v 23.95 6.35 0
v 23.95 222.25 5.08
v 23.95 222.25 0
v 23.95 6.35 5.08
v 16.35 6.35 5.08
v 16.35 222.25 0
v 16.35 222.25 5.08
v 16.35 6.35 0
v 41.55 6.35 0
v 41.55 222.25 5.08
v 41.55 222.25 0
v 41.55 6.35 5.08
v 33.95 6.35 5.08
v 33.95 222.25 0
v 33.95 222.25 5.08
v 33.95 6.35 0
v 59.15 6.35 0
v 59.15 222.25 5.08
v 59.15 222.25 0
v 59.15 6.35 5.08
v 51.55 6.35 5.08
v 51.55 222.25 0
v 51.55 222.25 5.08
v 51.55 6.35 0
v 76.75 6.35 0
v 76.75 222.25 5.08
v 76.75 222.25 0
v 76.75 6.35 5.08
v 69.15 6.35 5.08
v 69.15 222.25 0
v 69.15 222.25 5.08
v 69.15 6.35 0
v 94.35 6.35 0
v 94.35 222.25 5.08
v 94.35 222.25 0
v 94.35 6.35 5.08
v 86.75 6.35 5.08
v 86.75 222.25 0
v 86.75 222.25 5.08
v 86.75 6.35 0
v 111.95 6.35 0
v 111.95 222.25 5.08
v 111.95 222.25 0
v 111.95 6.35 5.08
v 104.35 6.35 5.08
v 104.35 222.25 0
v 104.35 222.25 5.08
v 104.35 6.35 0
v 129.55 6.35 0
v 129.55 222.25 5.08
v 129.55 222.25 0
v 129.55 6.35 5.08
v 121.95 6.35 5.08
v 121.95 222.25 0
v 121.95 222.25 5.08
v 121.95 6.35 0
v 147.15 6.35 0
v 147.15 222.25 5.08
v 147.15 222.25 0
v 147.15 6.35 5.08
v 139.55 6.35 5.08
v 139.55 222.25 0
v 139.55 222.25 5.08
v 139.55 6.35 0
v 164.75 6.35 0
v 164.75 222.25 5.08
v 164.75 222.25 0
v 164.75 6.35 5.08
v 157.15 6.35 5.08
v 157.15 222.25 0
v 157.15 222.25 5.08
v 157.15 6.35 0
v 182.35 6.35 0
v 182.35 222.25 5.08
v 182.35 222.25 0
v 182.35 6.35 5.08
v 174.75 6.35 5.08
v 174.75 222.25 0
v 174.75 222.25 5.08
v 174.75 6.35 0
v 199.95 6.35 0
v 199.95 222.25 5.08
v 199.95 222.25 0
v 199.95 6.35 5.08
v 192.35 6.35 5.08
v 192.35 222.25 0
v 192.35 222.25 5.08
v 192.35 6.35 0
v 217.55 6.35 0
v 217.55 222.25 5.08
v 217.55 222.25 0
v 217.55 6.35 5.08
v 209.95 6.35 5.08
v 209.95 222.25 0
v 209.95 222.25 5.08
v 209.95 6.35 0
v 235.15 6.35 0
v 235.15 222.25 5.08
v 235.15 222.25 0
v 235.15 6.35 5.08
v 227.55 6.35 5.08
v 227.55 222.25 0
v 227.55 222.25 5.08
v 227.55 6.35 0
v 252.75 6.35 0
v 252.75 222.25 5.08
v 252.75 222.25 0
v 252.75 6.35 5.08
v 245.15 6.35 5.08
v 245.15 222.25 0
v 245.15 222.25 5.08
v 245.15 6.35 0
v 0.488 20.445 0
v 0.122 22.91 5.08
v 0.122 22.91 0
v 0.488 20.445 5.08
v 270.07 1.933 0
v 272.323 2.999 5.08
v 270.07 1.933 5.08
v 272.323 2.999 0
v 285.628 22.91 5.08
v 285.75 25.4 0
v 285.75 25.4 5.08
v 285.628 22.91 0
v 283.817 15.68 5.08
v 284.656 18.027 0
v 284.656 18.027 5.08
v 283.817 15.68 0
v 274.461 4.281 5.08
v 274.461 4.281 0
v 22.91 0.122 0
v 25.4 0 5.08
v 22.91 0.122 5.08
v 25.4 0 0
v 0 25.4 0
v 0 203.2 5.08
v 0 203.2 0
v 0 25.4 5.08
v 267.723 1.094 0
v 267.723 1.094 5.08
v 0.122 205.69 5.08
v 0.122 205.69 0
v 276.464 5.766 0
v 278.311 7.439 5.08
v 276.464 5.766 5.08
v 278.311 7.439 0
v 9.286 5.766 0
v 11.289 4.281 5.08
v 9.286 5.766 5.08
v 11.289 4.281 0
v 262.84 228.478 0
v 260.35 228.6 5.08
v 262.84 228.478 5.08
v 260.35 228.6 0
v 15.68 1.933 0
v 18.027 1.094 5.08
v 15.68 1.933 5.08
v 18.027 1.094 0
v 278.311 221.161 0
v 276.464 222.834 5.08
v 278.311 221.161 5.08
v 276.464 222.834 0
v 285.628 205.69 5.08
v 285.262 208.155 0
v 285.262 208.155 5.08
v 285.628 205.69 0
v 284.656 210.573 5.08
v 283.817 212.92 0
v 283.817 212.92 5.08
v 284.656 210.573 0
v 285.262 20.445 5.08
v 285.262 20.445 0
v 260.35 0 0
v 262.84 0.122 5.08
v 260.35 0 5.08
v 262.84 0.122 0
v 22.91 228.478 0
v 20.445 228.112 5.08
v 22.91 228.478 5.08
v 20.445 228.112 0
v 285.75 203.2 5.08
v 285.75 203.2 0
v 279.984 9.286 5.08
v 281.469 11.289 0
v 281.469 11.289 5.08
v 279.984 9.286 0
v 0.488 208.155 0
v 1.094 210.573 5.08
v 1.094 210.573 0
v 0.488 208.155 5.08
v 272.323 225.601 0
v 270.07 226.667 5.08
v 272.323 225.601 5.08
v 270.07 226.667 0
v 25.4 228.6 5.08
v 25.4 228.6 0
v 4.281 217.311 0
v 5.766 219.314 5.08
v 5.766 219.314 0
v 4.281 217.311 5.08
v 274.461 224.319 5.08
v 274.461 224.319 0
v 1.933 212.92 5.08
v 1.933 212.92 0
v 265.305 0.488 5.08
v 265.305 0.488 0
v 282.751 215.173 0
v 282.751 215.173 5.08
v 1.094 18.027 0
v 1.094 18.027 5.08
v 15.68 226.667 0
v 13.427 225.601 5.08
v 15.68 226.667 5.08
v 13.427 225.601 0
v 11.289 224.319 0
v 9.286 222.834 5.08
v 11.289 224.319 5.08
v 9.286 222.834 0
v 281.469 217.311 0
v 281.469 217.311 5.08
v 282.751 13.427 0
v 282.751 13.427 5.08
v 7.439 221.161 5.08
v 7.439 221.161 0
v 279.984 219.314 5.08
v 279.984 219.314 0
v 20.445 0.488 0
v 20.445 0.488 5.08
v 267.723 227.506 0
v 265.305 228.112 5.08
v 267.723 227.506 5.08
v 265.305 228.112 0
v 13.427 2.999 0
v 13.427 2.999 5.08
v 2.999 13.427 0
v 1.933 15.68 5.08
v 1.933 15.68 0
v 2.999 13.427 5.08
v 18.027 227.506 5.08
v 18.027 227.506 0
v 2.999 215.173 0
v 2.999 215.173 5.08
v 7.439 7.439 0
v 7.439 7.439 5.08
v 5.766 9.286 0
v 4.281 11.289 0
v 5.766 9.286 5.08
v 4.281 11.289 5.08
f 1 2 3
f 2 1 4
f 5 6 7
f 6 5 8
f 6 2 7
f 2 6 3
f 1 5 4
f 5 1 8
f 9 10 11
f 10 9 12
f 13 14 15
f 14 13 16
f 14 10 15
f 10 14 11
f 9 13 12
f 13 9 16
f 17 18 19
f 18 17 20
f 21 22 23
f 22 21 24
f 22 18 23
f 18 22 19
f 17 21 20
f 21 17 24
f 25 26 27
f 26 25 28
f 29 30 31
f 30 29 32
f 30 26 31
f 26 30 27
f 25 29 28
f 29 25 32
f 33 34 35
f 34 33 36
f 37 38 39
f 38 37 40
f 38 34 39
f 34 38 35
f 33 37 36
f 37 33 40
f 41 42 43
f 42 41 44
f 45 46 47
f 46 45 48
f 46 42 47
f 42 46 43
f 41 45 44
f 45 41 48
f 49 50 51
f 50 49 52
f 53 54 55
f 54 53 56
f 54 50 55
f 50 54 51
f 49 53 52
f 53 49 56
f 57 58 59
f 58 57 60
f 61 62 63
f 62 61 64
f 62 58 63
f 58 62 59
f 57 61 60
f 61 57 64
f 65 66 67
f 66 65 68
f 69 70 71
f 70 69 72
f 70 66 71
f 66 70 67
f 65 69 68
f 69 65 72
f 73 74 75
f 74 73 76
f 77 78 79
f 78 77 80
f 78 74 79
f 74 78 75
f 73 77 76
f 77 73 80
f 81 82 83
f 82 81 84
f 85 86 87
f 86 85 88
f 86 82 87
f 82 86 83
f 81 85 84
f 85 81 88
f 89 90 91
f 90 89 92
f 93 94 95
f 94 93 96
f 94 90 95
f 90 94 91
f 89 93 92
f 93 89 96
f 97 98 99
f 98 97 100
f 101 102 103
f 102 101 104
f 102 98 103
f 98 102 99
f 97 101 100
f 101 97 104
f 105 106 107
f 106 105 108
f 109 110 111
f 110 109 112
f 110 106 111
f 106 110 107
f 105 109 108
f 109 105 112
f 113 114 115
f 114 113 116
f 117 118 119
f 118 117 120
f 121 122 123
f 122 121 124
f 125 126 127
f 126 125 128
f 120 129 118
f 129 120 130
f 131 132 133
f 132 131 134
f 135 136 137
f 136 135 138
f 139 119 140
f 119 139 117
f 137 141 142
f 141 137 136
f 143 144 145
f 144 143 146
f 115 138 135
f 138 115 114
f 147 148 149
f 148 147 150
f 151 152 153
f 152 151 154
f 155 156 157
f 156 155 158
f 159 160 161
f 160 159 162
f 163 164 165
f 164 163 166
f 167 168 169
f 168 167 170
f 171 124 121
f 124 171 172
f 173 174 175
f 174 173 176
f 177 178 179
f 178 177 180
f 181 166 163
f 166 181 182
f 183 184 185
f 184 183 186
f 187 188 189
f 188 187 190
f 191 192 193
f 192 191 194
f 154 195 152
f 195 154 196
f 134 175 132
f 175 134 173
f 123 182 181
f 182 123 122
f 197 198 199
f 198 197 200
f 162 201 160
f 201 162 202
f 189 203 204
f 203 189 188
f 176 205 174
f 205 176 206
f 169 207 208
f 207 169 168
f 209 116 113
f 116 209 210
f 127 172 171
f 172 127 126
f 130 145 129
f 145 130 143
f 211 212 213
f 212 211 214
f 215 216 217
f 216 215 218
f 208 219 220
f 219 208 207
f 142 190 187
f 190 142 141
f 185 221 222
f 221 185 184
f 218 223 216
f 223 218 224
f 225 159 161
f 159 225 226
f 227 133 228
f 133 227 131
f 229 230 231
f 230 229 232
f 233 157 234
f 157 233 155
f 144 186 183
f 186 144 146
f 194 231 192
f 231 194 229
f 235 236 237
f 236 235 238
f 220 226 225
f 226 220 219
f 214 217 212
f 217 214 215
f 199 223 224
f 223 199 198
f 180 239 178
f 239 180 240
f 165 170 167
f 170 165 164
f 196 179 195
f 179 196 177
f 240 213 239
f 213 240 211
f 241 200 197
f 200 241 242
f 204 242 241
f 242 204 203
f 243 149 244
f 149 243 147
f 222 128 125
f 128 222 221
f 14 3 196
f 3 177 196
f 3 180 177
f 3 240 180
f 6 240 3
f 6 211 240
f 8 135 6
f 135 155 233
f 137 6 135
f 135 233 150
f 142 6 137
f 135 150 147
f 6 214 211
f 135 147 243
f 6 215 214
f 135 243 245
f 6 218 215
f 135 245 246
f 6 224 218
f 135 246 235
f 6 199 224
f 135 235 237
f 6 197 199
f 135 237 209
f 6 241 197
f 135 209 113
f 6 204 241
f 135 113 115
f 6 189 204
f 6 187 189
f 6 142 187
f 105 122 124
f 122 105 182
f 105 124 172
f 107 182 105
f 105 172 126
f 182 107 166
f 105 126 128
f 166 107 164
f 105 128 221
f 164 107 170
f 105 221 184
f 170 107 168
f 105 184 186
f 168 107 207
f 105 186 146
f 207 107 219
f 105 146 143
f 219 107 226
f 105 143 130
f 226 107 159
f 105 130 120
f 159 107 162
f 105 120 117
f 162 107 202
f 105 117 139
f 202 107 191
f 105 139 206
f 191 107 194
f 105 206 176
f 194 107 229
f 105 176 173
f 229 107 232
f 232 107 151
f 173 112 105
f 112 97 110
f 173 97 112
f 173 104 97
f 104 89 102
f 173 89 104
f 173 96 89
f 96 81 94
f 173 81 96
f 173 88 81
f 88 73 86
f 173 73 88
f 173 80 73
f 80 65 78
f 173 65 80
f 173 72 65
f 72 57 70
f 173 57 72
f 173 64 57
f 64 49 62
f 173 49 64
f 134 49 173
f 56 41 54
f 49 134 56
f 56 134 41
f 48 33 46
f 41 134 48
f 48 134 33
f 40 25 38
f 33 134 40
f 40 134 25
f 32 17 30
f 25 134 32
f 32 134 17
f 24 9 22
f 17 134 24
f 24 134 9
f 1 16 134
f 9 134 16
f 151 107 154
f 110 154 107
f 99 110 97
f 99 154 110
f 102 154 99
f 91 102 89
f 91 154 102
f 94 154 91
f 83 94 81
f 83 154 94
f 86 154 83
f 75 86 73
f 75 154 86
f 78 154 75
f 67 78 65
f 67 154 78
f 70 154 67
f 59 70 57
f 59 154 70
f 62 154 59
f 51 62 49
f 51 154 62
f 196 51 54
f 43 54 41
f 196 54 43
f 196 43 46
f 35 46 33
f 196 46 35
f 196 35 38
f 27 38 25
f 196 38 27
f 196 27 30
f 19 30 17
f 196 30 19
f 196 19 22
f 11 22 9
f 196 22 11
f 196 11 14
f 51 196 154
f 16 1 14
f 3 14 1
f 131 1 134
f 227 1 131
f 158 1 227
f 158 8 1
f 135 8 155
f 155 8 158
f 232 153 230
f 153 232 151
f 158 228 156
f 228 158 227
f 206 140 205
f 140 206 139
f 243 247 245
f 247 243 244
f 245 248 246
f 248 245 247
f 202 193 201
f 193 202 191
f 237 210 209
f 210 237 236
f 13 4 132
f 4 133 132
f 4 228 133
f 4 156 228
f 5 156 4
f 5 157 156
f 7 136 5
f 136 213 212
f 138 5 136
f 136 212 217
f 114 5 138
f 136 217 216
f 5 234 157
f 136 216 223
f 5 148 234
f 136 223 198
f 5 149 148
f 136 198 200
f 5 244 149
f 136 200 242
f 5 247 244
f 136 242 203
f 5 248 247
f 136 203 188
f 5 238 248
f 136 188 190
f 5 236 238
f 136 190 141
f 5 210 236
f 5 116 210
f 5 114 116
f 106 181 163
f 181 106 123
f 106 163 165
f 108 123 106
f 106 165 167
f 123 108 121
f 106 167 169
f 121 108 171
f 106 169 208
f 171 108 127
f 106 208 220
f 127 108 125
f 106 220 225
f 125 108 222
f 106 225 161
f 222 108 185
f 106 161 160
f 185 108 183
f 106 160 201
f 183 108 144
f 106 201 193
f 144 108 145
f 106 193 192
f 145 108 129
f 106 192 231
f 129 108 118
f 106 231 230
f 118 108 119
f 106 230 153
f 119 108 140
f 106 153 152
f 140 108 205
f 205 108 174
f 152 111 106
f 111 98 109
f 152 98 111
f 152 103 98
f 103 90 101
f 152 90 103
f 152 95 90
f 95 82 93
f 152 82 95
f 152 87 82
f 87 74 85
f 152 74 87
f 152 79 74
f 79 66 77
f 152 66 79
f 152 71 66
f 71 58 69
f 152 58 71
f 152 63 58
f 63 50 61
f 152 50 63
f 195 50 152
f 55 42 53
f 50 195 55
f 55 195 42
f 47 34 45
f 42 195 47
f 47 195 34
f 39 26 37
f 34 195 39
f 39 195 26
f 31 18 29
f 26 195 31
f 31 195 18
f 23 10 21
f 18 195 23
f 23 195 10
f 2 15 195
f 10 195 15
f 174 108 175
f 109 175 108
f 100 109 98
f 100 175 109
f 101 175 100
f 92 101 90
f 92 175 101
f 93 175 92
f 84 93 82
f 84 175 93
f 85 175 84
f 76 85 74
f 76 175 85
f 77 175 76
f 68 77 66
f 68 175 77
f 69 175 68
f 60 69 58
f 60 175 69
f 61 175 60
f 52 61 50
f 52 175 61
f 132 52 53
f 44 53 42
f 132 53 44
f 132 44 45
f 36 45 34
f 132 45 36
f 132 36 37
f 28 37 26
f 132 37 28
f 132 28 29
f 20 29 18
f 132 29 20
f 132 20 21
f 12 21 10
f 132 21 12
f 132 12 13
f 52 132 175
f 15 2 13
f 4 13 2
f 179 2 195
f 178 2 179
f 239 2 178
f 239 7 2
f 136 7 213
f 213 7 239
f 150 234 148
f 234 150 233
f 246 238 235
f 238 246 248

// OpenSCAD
// file: model-forge/model-forge/tray.scad
// model-forge/tray.scad — rounded-corner outer panel with a recessed
// inset pocket (e.g. a "cooking dish" recess): a raised rim around the
// edge, floor thickness under the pocket, and an optional thin lip
// flange around the base — sized to slide into a support-rail groove
// (like the wooden rails inside the real Tiny Land oven cavity) rather
// than just resting loose.
//
//   use <model-forge/tray.scad>
//   rounded_tray(outer_width=285.75, outer_height=228.6, corner_radius=25.4,
//                floor_thickness=5.08, rim_height=3.81, inset_margin=6.35,
//                lip_width=3, lip_thickness=2);
//
// Shape: outer_width x outer_height slab, rounded corners (corner_radius),
// total height = floor_thickness + rim_height. A pocket is cut from the
// top, inset_margin in from every edge, cutting down through rim_height
// and stopping at floor_thickness from the bottom — so floor_thickness is
// what's left under the pocket, rim_height is how tall the surrounding
// wall stands above the pocket floor.
//
// The lip (lip_width/lip_thickness) is a thin flange at the TOP of the
// rim (from total_height-lip_thickness to total_height), sticking out
// lip_width beyond the main body on every side — corrected 2026-09-11
// per feedback on the real rail photo: the groove is near the top of the
// cavity wall, not the bottom. Both default to 0 (no lip) so existing
// calls keep working unchanged.

// hull-of-4-circles rounded rect — much faster to render than a
// minkowski-based approach for this shape (no minkowski sum needed).
module rounded_rect_2d(w, h, r) {
  hull() {
    translate([r, r]) circle(r = r, $fn = 64);
    translate([w - r, r]) circle(r = r, $fn = 64);
    translate([r, h - r]) circle(r = r, $fn = 64);
    translate([w - r, h - r]) circle(r = r, $fn = 64);
  }
}

module rounded_tray(
  outer_width,
  outer_height,
  corner_radius,
  floor_thickness,
  rim_height,
  inset_margin,
  lip_width = 0,
  lip_thickness = 0
) {
  total_height = floor_thickness + rim_height;

  union() {
    if (lip_width > 0 && lip_thickness > 0) {
      translate([-lip_width, -lip_width, total_height - lip_thickness])
        linear_extrude(height = lip_thickness)
          rounded_rect_2d(outer_width + 2 * lip_width, outer_height + 2 * lip_width, corner_radius + lip_width);
    }
    difference() {
      linear_extrude(height = total_height)
        rounded_rect_2d(outer_width, outer_height, corner_radius);
      translate([inset_margin, inset_margin, floor_thickness])
        cube([outer_width - 2 * inset_margin, outer_height - 2 * inset_margin, rim_height + 1]);
    }
  }
}
// file: model-forge/grate.scad
// model-forge/grate.scad — rounded-corner panel cut into an oven-rack-
// style bar grate: a solid frame border, parallel bars across the
// interior with open gaps between them.
//
//   use <model-forge/grate.scad>
//   oven_grate(outer_width=285.75, outer_height=228.6, corner_radius=25.4,
//              thickness=5.08, frame_width=6.35, bar_width=10, gap_width=7.6);
//
// Bars run parallel to the height (vertical bars spanning the width),
// starting and ending with a solid bar against the frame — real oven
// racks don't have a gap right at the edge. Spacing is pitch-based
// (bar_width + gap_width repeating); it won't divide the interior
// perfectly evenly on every size, so the last bar absorbs any leftover
// width. Tune bar_width/gap_width and re-render if that's visible.
use <model-forge/tray.scad> // rounded_rect_2d

module oven_grate(outer_width, outer_height, corner_radius, thickness, frame_width, bar_width, gap_width) {
  inner_width = outer_width - 2 * frame_width;
  inner_height = outer_height - 2 * frame_width;
  pitch = bar_width + gap_width;
  n_gaps = floor((inner_width - bar_width) / pitch);

  difference() {
    linear_extrude(height = thickness)
      rounded_rect_2d(outer_width, outer_height, corner_radius);
    for (i = [0 : n_gaps - 1]) {
      x = frame_width + bar_width + i * pitch;
      translate([x, frame_width, -1])
        cube([gap_width, inner_height, thickness + 2]);
    }
  }
}
// main file
// Tiny Land oven insert — grate/rack variant. Standalone, printable file.
// View > Show Customizer for sliders.
use <model-forge/grate.scad>

/* [Size — inches] */
outer_width_in  = 11.25;
outer_height_in = 9;
corner_radius_in = 1;

/* [Bars] */
thickness_mm   = 5.08; // [1:0.1:15]  settable independently of everything else
frame_width_mm = 6.35; // [2:0.5:20]  solid border
bar_width_mm   = 10;   // [3:0.5:30]  requested pitch — auto-fit keeps every bar this width
gap_width_mm   = 7.6;  // [2:0.5:20]  requested pitch — auto-fit tunes this slightly to divide evenly

IN_TO_MM = 25.4;

oven_grate(
  outer_width   = outer_width_in * IN_TO_MM,
  outer_height  = outer_height_in * IN_TO_MM,
  corner_radius = corner_radius_in * IN_TO_MM,
  thickness     = thickness_mm,
  frame_width   = frame_width_mm,
  bar_width     = bar_width_mm,
  gap_width     = gap_width_mm
);
